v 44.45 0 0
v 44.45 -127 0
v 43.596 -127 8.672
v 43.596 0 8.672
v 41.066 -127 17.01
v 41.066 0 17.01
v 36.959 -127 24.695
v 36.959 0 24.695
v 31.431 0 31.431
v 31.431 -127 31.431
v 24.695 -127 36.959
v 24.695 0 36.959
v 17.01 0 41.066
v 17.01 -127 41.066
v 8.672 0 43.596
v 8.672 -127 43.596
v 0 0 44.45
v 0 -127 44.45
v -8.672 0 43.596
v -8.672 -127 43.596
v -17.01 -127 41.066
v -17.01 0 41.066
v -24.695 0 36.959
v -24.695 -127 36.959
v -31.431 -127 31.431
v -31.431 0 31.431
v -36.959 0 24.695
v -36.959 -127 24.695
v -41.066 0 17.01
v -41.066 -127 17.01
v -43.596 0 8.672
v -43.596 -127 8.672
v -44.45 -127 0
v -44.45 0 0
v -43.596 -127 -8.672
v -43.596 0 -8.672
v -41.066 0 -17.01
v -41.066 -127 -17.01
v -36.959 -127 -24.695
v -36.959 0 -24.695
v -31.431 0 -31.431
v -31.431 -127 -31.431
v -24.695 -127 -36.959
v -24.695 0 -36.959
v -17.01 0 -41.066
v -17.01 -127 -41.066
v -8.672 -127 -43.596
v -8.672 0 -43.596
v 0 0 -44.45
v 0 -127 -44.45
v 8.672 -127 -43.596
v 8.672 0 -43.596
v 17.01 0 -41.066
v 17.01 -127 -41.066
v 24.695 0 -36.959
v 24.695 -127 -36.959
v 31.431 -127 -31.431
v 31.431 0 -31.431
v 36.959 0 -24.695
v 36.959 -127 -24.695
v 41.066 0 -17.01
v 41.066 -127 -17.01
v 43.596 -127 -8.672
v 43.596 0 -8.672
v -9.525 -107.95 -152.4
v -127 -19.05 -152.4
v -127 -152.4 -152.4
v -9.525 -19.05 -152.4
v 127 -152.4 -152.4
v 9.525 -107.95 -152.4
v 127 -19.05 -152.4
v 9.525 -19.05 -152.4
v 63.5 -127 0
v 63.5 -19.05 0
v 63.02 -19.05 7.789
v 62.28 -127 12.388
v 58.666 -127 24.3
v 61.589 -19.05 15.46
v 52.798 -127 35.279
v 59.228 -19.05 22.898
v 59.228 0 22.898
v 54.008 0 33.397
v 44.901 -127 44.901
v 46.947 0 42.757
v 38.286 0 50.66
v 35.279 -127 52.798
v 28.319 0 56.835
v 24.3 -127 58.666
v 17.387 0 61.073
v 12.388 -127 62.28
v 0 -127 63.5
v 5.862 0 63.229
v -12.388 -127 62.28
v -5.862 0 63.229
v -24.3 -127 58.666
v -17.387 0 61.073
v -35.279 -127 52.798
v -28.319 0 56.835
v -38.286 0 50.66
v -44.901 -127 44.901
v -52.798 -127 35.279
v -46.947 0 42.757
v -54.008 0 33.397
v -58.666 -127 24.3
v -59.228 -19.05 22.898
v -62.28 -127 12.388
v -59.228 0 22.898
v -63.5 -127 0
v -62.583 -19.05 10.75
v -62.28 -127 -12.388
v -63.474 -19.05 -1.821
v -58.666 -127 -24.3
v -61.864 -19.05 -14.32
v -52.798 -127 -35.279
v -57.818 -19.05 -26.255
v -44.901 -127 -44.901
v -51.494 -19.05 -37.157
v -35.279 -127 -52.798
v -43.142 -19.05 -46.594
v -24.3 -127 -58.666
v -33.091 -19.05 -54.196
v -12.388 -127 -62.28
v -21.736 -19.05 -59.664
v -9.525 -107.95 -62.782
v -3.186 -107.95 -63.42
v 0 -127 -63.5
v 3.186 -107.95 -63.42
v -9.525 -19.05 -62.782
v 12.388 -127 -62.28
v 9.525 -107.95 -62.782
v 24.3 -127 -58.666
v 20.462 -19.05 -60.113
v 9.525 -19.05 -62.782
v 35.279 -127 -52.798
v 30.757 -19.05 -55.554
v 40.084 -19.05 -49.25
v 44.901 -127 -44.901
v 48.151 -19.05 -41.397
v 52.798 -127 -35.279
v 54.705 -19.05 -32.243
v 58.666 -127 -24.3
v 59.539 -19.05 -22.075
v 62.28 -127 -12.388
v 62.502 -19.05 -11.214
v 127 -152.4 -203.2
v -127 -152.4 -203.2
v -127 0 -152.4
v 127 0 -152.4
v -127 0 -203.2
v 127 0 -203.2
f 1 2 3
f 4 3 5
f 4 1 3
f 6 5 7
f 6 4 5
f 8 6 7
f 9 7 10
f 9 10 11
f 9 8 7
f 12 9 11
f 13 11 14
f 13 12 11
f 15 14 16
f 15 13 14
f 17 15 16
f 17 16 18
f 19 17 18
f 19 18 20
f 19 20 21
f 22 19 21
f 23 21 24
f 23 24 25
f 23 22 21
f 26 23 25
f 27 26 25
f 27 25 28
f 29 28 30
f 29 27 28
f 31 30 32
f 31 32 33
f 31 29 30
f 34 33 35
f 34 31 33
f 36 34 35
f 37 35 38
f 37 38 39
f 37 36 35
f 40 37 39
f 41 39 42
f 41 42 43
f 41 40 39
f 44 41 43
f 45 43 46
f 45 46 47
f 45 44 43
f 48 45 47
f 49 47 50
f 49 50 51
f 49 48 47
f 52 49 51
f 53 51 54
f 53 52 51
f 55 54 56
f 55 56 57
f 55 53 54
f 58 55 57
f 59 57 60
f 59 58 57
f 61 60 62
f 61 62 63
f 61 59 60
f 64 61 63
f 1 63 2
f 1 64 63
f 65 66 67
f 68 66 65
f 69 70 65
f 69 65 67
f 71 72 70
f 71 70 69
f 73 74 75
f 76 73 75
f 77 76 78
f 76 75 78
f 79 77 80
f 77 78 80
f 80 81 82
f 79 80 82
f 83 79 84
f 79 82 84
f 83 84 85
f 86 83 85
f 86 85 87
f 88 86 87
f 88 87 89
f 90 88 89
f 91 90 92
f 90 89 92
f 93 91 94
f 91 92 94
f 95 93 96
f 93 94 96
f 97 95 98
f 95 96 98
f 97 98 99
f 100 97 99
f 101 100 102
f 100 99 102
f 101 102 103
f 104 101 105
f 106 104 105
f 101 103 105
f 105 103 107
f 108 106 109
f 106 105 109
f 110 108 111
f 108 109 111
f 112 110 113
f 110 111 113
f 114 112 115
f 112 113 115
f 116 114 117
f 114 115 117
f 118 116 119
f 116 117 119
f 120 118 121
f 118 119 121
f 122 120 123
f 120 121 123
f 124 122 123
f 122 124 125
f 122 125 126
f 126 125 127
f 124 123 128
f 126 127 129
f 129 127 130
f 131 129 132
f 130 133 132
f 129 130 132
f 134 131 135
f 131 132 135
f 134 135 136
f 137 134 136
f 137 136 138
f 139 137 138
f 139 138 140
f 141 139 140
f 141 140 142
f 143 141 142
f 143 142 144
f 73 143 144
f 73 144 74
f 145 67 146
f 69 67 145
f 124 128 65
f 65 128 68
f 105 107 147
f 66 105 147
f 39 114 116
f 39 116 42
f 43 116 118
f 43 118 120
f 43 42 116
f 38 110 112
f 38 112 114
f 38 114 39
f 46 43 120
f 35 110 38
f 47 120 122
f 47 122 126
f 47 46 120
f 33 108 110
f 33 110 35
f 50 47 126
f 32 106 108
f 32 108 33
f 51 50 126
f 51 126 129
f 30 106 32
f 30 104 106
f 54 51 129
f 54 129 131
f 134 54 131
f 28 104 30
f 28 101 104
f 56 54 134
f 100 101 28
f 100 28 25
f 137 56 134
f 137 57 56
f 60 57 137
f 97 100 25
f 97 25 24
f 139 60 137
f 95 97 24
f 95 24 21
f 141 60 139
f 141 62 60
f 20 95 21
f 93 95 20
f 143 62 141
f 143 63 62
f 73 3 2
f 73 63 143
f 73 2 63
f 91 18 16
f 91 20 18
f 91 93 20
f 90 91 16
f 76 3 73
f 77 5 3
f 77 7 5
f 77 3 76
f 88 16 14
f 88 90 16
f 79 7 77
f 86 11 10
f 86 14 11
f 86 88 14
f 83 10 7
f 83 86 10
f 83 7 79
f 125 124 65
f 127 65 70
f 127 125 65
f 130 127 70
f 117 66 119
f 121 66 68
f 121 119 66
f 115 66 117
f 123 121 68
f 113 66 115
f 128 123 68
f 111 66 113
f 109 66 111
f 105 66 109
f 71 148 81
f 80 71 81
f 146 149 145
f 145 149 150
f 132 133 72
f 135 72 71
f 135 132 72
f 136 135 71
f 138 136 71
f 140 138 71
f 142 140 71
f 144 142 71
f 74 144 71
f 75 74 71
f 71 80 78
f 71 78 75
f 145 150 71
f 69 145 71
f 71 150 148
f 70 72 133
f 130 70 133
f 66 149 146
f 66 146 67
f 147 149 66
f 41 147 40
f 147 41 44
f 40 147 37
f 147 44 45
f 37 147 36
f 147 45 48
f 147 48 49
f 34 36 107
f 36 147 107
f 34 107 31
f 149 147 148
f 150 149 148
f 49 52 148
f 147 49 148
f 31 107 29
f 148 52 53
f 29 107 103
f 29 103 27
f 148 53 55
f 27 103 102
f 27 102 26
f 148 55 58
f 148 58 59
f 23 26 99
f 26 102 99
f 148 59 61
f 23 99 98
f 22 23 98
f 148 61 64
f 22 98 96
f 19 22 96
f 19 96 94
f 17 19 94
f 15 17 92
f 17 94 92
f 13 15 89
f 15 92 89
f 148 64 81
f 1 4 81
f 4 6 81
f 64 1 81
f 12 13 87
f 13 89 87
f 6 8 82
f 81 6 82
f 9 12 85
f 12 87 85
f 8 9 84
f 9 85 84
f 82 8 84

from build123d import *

# Parameters (mm, degrees)
F0_R     = 63.5
F0_R_2   = 44.45
F1_DEPTH = 127
F3_DEPTH = 19.05
F4_W     = 254
F4_H     = 50.8
F5_DEPTH = 152.4
F7_DEPTH = 88.9


with BuildPart() as f1:
    # F0 (on Front) → F1 (new body)
    with BuildSketch(Plane.XZ):
        Circle(F0_R)
        Circle(F0_R_2, mode=Mode.SUBTRACT)
    extrude(amount=F1_DEPTH)

    # F2 (on Front) → F3 (join)
    with BuildSketch(Plane.XZ):
        with BuildLine():
            ThreePointArc((59.227747, 22.898122), (0, -63.5), (-59.227747, 22.898122))
            Line((-59.227747, 22.898122), (-127, -152.4))
            Line((-127, -152.4), (127, -152.4))
            Line((127, -152.4), (59.227747, 22.898122))
        make_face()
    extrude(amount=F3_DEPTH)

    # F4 (on Front) → F5 (join)
    with BuildSketch(Plane.XZ):
        with Locations((0, -177.8)):
            Rectangle(F4_W, F4_H)
    extrude(amount=F5_DEPTH)

    # F6 (on face) → F7 (join)
    with BuildSketch(Plane.XZ.offset(19.05)):
        with BuildLine():
            ThreePointArc((9.525, -62.781561), (0, -63.5), (-9.525, -62.781561))
            Line((-9.525, -62.781561), (-9.525, -152.4))
            Line((-9.525, -152.4), (9.525, -152.4))
            Line((9.525, -152.4), (9.525, -62.781561))
        make_face()
    extrude(amount=F7_DEPTH)


solid = f1.part
